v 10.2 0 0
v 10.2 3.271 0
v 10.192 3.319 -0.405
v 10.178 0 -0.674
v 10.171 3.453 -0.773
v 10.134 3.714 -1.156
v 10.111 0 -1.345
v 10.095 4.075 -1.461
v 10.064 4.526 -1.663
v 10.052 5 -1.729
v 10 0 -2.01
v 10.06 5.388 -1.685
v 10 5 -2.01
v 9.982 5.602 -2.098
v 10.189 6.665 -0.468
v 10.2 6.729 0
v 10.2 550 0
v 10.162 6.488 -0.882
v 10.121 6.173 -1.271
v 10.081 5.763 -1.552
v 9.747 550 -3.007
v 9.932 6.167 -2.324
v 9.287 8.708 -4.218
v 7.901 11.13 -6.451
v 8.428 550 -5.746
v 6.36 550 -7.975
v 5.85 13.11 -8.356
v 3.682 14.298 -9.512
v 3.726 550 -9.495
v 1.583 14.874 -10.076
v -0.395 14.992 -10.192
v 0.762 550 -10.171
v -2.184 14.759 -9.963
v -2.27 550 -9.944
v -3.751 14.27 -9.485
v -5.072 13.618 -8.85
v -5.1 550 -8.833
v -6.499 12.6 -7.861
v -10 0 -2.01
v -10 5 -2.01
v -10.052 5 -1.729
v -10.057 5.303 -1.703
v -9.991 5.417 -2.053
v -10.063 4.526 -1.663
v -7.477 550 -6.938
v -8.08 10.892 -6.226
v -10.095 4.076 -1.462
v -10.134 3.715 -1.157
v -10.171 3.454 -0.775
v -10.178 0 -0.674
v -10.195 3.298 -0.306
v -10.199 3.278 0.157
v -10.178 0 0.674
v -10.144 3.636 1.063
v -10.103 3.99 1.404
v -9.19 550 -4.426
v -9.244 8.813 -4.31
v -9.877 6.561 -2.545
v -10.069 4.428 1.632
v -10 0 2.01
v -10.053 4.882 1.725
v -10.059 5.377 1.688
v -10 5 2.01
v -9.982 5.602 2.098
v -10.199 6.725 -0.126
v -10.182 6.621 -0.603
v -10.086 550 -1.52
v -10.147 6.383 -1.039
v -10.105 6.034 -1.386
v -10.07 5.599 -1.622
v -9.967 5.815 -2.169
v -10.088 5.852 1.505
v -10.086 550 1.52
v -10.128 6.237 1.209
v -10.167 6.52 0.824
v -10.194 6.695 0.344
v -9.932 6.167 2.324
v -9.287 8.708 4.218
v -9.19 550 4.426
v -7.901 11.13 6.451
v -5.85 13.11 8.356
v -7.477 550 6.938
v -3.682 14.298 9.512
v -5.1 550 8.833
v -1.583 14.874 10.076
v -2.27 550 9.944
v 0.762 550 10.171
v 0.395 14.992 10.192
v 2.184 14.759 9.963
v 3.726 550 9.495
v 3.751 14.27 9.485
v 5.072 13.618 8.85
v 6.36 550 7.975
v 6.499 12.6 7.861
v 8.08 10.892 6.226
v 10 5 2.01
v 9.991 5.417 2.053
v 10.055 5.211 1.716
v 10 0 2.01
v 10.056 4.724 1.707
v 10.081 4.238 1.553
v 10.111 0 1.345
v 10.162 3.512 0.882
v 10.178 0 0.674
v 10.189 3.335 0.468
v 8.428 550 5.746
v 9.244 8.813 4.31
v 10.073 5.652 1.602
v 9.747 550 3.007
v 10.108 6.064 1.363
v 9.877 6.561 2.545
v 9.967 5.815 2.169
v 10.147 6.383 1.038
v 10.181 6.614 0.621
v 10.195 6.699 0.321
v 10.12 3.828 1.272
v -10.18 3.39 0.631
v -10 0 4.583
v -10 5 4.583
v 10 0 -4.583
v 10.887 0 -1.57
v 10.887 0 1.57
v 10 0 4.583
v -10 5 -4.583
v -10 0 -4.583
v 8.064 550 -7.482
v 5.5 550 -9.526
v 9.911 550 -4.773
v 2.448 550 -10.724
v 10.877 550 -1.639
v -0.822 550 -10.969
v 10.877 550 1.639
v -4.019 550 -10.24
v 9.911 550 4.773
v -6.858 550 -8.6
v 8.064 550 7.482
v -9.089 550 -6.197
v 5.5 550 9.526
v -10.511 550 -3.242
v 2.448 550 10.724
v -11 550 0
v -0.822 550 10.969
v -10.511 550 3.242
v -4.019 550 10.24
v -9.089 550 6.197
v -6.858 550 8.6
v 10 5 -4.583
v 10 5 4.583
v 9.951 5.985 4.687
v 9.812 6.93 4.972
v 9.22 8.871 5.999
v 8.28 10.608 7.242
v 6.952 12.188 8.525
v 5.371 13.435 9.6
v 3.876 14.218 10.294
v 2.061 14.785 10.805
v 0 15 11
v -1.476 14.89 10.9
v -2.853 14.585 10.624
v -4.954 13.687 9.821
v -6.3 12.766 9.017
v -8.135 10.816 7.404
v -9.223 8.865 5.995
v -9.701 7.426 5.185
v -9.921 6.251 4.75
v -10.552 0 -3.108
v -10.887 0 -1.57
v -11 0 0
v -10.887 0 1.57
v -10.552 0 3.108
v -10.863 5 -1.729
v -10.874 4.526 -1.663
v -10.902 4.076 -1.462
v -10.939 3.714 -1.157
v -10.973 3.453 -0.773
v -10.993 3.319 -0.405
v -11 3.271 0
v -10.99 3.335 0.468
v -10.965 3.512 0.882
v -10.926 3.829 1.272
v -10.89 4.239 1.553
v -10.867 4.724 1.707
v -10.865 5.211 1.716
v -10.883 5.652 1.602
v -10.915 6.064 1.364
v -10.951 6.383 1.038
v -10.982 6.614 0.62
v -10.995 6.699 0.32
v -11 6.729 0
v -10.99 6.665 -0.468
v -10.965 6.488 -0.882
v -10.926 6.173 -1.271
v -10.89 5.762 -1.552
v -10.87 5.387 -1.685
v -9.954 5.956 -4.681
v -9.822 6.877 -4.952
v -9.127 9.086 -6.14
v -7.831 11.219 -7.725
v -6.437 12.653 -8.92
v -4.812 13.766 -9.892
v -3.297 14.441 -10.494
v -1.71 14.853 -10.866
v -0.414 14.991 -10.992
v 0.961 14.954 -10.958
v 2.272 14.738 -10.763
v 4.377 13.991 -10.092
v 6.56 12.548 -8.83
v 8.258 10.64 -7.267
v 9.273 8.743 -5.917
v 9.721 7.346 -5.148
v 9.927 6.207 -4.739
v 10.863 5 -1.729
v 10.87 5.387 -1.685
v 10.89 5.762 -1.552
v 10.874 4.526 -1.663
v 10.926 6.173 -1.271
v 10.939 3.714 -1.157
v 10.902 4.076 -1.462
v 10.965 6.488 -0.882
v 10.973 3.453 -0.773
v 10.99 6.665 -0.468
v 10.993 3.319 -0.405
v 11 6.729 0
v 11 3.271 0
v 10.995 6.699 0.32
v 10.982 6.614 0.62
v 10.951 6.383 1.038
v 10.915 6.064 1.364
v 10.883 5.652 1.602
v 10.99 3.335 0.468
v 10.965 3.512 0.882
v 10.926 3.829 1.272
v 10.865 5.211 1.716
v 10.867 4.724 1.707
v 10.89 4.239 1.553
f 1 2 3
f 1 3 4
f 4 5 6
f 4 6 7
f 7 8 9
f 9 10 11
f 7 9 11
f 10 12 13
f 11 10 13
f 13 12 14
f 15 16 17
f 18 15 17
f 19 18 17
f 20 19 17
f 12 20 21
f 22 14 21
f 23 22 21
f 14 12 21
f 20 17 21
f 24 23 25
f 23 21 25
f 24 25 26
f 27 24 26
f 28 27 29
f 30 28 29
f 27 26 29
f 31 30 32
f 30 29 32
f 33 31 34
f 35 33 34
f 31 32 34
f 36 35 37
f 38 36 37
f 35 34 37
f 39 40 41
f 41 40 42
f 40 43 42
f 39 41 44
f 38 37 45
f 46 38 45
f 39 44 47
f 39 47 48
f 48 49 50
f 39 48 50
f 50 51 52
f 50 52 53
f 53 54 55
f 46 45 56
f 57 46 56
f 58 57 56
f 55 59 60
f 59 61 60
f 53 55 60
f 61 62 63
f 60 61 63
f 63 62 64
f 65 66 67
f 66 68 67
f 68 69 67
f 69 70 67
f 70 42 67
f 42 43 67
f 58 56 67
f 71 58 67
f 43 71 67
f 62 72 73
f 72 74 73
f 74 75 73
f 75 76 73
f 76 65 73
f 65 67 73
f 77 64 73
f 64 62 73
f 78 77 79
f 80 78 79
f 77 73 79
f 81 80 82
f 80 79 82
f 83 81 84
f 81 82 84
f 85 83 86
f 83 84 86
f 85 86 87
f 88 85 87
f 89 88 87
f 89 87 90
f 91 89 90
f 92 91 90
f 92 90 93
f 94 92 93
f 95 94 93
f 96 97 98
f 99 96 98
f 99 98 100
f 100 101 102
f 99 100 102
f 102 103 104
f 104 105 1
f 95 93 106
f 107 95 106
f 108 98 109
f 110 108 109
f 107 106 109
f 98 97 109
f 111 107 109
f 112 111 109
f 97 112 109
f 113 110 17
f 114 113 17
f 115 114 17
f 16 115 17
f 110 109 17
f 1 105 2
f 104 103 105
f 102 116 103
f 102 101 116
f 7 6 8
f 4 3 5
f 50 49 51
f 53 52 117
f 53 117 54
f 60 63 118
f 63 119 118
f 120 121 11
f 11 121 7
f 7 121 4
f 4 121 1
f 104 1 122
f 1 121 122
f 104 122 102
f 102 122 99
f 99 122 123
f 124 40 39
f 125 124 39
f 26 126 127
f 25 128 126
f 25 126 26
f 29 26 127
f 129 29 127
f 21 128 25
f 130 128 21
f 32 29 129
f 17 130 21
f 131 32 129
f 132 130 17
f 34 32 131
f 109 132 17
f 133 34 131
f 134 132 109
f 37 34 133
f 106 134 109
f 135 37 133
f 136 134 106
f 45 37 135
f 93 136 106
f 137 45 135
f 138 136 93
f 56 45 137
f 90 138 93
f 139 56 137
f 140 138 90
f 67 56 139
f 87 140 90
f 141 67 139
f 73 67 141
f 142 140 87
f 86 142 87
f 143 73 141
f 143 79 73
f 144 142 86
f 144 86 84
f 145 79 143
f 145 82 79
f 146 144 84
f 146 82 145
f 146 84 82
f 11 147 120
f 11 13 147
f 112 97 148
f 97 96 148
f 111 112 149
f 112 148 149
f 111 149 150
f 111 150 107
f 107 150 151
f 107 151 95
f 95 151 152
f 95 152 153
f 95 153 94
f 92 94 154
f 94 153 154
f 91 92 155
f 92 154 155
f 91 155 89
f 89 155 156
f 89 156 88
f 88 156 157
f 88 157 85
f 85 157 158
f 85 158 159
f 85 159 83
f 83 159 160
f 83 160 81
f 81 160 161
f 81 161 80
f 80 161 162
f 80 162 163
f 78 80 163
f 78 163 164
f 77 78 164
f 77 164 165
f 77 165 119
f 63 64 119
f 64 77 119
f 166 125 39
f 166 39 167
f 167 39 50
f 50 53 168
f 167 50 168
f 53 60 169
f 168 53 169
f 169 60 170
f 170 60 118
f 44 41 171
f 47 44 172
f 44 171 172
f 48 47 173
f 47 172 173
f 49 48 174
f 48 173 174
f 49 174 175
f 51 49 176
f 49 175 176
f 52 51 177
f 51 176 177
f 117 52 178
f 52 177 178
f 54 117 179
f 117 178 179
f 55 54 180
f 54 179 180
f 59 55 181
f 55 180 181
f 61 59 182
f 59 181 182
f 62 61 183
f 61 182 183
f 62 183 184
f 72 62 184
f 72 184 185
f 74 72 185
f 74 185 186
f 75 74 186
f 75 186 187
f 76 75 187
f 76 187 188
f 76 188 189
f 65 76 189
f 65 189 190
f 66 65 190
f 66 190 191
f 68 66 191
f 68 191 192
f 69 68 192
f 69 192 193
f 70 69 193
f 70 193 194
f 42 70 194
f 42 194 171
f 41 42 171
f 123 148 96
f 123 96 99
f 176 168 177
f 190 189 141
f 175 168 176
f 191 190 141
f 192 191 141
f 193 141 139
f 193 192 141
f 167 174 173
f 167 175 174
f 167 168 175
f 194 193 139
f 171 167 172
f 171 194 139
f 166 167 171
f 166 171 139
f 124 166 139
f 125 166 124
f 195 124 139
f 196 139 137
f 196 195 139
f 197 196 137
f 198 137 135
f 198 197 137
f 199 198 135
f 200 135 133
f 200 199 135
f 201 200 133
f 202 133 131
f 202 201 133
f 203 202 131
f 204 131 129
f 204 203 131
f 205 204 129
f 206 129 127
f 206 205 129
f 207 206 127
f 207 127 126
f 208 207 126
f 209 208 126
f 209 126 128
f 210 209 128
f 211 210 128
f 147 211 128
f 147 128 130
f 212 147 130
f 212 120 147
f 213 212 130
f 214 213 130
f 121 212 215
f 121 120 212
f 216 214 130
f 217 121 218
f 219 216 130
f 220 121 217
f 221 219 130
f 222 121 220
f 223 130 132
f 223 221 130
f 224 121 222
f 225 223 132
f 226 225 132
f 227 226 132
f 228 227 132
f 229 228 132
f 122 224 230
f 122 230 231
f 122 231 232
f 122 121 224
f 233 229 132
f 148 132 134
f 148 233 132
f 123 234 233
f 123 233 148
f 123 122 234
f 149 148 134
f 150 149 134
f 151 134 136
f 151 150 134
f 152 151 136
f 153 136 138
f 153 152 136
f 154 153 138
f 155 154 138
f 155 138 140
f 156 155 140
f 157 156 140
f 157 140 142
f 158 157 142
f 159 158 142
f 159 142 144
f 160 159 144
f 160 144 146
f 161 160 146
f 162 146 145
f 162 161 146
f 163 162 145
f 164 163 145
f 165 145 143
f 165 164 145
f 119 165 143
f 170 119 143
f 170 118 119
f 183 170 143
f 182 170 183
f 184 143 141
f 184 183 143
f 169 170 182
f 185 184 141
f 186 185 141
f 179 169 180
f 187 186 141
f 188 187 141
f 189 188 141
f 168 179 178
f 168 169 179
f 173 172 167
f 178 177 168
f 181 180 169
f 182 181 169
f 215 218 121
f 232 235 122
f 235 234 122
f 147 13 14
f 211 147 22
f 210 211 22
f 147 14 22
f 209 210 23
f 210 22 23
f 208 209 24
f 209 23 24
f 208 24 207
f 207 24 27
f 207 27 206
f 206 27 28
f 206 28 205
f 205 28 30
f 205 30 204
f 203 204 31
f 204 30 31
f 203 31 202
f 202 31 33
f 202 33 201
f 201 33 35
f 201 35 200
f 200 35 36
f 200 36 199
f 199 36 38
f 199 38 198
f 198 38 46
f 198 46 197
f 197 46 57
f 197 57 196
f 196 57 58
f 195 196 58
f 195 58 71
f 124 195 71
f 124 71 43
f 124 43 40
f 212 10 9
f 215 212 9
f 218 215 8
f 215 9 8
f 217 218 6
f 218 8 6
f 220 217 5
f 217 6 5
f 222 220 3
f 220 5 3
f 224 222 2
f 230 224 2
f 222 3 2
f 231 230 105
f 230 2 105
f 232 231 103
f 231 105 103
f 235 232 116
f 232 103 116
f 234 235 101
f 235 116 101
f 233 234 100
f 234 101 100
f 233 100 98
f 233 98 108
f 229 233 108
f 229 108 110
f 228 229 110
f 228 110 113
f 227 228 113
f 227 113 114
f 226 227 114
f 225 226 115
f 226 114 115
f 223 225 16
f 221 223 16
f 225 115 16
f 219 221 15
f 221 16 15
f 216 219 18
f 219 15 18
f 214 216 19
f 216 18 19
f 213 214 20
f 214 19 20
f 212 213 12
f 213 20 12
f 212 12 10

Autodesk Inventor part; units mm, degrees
ref_plane "YZ Plane" through (0, 0, 0) normal (1, 0, 0) x (0, 1, 0)
ref_plane "XZ Plane" through (0, 0, 0) normal (0, 1, 0) x (-1, 0, 0)
ref_plane "XY Plane" through (0, 0, 0) normal (0, 0, 1) x (1, 0, 0)
sketch "Sketch1" plane through (0, 0, 0) normal (0, 1, 0) x (-1, 0, 0)
  circle A0 centre (0, 0) radius 11
  dimension "d0" = 22
extrude "Extrusion1" add sketch "Sketch1" along normal blind 550
sketch "Sketch7" plane through (0, 550, 0) normal (0, 1, 0) x (1, 0, 0)
  circle A0 centre (0, 0) radius 10.2
  dimension "d23" = 20.4
extrude "Extrusion3" cut sketch "Sketch7" against normal through all
sketch "Sketch8" plane through (0, 0, 0) normal (0, -1, 0) x (1, 0, 0)
  circle A0 centre (0, 0) radius 11 projected
  point P0 (0, 11)
ref_plane "Work Plane3" through (0, 0, 11) normal (0, 0, 1) x (1, 0, 0)
sketch "Sketch9" plane through (0, 0, 11) normal (0, 0, 1) x (1, 0, 0)
  arc A0 (10, 5) -> (-10, 5) centre (0, 5) ccw
  line L0 (-10, 5) -> (-10, 0)
  line L1 (11, 0) -> (-11, 0) projected
  line L2 (10, 5) -> (10, 0)
  point P0 (0, 0)
  dimension "d26" = 5
  dimension "d27" = 20
extrude "Extrusion4" cut sketch "Sketch9" against normal through all
sketch "Sketch10" plane through (0, 0, 0) normal (0, -1, 0) x (1, 0, 0)
  circle A0 centre (0, 0) radius 11 projected
  point P0 (11, 0)
ref_plane "Work Plane4" through (11, 0, 0) normal (1, 0, 0) x (0, 1, 0)
sketch "Sketch11" plane through (11, 0, 0) normal (1, 0, 0) x (0, 1, 0)
  line L0 (0, -4.5826) -> (0, 4.5826) projected
  point P0 (0, 0)
  point P1 (5, 0)
  point P2 (0, 0)
  dimension "d30" = 5
hole "Hole3" at (11, 5, 0) direction (-1, 0, 0) diameter 3.4587 end through all thread size "M4x0.5" class "6H" standard "ISO Metric profile"
equation "\"d36\" = Thickness"
equation "\"BendRadius\" = Thickness"
equation "\"BendReliefWidth\" = Thickness"
equation "\"BendReliefDepth\" = 0.5 * Thickness"
equation "\"CornerReliefSize\" = 4 * Thickness"
equation "\"MinimumRemnant\" = 2 * Thickness"
equation "\"TransitionRadius\" = BendRadius"
equation "\"JacobiRadiusSize\" = BendRadius"
equation "\"GapSize\" = Thickness"
equation "\"Thickness\" = 0.5"
properties part number "Output link body"
